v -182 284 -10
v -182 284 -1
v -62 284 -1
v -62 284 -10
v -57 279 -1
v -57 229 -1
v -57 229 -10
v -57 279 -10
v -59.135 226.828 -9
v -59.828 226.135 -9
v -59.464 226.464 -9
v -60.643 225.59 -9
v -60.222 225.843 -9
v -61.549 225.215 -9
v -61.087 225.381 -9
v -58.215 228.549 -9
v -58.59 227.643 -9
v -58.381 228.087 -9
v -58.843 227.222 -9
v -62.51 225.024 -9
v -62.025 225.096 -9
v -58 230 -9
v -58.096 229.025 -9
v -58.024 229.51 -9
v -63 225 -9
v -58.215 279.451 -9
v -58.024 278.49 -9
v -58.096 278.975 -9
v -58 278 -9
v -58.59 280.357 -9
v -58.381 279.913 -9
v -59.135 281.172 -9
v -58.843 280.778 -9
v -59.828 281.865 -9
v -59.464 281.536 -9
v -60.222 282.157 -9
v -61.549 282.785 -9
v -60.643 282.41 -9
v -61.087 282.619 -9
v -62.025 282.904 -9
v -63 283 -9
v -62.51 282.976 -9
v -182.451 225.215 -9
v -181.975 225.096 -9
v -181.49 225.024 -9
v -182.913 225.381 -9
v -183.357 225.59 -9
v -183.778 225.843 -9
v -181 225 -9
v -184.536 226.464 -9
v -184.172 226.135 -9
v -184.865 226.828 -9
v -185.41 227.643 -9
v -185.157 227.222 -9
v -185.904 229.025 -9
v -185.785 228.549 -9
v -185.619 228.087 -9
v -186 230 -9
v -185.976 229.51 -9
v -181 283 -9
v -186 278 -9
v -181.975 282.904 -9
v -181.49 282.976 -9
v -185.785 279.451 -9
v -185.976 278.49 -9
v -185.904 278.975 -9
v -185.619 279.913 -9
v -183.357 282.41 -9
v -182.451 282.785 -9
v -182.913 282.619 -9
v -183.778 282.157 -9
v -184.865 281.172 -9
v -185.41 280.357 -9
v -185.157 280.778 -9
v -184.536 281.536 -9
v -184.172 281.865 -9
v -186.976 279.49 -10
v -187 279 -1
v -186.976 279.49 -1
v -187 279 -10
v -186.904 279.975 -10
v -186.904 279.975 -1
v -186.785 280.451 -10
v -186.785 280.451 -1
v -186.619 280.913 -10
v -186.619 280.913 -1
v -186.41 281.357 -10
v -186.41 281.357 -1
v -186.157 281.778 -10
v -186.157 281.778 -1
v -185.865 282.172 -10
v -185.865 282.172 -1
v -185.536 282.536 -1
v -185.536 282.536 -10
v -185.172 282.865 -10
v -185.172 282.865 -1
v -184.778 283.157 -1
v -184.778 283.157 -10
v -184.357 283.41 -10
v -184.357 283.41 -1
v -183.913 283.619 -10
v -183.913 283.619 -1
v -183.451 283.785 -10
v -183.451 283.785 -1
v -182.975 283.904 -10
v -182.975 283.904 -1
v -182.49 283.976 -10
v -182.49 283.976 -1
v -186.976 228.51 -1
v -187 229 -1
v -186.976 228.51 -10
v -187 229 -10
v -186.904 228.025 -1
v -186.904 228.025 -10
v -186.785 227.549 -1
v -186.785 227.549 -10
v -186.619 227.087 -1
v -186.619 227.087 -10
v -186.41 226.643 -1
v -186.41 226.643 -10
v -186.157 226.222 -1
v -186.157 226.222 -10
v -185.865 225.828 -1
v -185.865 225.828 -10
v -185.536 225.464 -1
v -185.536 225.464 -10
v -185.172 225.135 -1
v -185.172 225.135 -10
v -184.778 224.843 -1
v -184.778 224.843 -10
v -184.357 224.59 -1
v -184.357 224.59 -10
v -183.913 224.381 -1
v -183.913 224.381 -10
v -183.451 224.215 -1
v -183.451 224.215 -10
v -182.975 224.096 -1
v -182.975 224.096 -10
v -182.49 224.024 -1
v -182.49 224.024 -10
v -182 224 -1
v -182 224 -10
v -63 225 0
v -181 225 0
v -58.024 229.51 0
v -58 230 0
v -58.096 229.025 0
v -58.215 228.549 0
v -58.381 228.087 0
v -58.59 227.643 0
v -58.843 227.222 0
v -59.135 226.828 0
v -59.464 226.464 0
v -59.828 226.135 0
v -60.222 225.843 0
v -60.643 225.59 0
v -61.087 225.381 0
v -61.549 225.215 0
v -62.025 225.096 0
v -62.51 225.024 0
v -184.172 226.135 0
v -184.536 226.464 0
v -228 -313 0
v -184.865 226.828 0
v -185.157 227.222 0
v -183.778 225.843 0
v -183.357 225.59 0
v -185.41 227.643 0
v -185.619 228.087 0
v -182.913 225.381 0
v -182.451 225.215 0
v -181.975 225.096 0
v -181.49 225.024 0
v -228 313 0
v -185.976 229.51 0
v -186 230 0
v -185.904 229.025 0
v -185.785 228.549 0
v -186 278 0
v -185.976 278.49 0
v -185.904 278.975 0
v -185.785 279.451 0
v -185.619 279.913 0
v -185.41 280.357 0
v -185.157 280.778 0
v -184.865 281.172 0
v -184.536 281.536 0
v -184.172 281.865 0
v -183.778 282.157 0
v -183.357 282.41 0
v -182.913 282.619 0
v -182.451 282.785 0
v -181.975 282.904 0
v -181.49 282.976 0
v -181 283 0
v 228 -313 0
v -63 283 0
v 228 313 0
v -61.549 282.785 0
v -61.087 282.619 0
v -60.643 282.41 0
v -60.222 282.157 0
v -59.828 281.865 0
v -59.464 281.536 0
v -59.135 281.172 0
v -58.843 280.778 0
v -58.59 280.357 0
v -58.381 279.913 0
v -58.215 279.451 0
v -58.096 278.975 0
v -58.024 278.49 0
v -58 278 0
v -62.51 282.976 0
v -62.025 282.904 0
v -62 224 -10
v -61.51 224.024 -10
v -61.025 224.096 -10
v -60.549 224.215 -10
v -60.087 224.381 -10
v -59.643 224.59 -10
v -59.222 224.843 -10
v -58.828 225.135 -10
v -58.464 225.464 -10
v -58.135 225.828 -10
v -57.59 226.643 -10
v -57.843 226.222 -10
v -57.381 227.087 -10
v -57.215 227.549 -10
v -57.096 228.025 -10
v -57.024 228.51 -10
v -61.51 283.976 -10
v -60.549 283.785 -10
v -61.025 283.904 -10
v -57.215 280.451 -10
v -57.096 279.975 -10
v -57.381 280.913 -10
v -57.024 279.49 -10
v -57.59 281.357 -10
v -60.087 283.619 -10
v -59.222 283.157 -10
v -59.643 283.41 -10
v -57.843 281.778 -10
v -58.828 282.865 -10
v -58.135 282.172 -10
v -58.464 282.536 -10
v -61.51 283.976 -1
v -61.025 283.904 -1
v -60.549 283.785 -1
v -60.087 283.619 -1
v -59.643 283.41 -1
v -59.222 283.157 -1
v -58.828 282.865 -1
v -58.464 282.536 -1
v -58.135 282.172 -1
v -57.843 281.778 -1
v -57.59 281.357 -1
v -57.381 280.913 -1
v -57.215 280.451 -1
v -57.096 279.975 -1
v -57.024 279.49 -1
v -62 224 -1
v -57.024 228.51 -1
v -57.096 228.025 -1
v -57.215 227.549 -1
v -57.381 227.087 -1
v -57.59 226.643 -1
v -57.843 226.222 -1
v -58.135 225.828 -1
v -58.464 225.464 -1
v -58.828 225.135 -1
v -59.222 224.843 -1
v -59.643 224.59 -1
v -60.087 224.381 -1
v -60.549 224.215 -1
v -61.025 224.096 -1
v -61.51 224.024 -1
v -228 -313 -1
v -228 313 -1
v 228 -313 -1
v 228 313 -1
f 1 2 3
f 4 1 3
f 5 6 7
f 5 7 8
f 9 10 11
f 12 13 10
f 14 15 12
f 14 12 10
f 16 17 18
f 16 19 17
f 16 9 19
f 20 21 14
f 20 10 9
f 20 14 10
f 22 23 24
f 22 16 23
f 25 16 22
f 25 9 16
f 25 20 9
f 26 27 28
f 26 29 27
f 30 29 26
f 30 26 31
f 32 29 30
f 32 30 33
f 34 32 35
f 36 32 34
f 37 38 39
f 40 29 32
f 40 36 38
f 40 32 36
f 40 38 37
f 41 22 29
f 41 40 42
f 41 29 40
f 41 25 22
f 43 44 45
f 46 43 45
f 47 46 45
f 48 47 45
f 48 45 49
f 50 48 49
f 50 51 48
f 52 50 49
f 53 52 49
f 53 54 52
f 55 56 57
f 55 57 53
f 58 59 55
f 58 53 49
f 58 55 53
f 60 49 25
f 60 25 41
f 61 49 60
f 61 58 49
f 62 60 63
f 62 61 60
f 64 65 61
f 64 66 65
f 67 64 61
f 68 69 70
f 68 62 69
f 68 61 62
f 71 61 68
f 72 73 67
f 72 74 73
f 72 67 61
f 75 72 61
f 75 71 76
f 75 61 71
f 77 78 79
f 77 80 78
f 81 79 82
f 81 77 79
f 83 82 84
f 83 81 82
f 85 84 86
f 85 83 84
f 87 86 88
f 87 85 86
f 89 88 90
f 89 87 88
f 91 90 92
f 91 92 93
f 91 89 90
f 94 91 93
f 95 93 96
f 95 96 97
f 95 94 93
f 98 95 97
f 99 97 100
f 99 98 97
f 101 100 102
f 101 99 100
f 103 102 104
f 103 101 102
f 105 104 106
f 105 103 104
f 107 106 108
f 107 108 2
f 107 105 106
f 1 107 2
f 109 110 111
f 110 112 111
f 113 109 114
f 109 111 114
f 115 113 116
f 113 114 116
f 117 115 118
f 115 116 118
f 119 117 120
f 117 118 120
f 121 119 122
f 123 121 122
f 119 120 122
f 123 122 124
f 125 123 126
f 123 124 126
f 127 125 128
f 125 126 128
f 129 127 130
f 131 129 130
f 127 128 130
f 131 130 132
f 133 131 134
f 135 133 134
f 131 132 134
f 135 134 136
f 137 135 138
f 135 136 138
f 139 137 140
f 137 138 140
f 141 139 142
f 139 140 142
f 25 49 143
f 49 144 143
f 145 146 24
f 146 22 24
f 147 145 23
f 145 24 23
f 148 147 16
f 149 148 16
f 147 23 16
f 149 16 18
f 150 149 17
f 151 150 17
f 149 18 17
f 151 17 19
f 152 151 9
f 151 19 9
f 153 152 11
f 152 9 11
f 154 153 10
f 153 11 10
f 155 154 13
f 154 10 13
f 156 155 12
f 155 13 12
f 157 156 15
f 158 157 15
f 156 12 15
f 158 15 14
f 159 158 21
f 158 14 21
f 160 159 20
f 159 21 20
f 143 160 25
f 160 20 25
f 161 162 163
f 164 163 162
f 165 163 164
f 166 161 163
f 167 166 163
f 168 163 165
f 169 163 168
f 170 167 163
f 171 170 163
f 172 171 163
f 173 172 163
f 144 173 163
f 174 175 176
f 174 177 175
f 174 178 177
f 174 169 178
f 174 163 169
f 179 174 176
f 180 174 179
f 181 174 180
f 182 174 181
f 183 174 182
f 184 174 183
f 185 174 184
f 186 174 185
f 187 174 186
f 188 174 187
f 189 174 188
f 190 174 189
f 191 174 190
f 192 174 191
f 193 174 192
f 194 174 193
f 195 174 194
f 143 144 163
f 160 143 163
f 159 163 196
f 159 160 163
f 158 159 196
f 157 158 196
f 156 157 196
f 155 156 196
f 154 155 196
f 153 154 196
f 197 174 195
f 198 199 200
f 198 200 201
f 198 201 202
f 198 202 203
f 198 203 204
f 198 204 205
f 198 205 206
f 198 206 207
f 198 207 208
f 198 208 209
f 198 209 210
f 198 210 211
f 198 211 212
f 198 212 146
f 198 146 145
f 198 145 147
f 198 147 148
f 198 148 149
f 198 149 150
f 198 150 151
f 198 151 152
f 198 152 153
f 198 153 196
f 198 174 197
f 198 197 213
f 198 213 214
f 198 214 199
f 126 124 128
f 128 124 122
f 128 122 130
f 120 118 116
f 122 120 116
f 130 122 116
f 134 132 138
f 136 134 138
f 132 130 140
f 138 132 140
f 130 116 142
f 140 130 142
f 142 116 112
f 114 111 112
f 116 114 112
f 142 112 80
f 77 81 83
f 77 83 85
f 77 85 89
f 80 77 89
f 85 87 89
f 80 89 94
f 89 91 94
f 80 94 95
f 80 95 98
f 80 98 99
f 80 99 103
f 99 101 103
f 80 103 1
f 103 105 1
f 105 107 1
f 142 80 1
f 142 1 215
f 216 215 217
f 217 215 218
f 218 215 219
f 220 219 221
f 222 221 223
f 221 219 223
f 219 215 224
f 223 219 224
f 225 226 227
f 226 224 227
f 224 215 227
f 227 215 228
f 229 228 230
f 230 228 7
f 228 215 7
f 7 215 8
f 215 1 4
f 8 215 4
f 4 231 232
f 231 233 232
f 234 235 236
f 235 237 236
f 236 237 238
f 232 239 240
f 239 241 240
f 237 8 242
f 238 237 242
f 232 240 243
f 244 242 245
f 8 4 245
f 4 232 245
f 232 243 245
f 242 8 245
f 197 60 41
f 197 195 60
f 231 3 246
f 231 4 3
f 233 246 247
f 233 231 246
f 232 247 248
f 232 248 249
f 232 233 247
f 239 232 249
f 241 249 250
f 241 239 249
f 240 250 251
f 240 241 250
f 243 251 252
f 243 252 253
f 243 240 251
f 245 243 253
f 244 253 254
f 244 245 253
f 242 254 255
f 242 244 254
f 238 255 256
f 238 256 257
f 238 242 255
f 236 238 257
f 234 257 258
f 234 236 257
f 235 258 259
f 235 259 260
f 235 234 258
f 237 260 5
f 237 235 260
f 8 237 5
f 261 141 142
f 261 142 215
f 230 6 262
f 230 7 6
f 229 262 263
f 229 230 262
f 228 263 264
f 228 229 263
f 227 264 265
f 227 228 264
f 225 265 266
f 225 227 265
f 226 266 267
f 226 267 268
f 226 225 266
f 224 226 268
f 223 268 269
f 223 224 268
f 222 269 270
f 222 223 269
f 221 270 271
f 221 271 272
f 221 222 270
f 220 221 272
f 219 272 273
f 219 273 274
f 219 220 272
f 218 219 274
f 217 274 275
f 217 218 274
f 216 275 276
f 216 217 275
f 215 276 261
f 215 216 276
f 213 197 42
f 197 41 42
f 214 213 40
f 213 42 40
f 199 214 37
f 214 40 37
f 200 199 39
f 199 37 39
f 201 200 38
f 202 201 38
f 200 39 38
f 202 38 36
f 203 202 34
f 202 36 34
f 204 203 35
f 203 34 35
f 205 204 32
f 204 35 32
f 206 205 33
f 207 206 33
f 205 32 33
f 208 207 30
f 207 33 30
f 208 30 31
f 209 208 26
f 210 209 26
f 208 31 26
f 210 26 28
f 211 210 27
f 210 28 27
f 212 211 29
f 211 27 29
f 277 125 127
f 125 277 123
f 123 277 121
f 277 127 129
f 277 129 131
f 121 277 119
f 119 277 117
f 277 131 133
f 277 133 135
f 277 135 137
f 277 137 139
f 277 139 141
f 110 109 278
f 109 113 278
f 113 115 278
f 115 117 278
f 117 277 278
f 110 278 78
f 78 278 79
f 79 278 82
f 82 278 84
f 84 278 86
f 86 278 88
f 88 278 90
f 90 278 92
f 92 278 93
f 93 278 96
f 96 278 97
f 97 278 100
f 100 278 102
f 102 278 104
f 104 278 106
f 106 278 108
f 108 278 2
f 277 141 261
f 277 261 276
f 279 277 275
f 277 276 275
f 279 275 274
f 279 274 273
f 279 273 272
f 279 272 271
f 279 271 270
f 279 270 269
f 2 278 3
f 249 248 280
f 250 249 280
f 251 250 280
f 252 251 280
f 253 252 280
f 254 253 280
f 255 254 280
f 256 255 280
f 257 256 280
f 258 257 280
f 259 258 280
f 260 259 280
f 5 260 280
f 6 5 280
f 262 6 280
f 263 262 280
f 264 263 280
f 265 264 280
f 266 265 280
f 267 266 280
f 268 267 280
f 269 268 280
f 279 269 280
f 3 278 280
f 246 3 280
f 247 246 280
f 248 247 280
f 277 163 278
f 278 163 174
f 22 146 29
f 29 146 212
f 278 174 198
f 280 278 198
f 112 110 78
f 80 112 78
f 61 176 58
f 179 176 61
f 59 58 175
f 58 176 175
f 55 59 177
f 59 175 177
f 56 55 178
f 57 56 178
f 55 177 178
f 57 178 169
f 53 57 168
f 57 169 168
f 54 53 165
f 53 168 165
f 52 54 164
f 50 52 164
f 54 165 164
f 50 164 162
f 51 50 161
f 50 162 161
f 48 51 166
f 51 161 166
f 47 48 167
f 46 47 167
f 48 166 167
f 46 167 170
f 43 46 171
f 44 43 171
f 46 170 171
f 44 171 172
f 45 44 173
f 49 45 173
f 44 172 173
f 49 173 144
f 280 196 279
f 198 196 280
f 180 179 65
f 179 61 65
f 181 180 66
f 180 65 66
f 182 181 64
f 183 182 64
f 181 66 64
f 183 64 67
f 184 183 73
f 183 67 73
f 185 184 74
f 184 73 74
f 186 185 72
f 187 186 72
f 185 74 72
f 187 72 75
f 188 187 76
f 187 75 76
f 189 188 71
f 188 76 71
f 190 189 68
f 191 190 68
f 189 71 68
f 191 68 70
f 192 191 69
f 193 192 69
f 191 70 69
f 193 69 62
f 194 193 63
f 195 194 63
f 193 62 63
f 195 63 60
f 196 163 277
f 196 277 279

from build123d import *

# Parameters (mm, degrees)
SKETCH1_W           = 456
SKETCH1_H           = 626
BASE_FLANGE1_DEPTH  = 1
SKETCH6_W           = 130
SKETCH6_H           = 60
BOSS_EXTRUDE1_DEPTH = 10
SKETCH7_W           = 128
SKETCH7_H           = 58
CUT_EXTRUDE2_DEPTH  = 1
SHELL2_START        = -186
SHELL2_OUTLINE_W    = 58
SHELL2_OUTLINE_H    = 8
SHELL2_DEPTH        = 128
FILLET1_R           = 5


# Read off the part's stored shape, not the designer's step: Shell2
# Sheet-metal steps are written as plain solids
with BuildPart() as part:
    # Sketch1 → Base-Flange1 (new body)
    with BuildSketch(Plane.XY):
        Rectangle(SKETCH1_W, SKETCH1_H)
    extrude(amount=-BASE_FLANGE1_DEPTH)

    # Sketch6 → Boss-Extrude1 (add)
    with BuildSketch(Plane.XY):
        with Locations((-122, 254)):
            Rectangle(SKETCH6_W, SKETCH6_H)
    extrude(amount=-BOSS_EXTRUDE1_DEPTH)

    # Sketch7 → Cut-Extrude2 (cut)
    with BuildSketch(Plane.XY):
        with Locations((-122, 254)):
            Rectangle(SKETCH7_W, SKETCH7_H)
    extrude(amount=-CUT_EXTRUDE2_DEPTH, mode=Mode.SUBTRACT)

    # Shell2 outline → Shell2 (cut)
    with BuildSketch(Plane.YZ.offset(SHELL2_START)):
        with Locations((254, -5)):
            Rectangle(SHELL2_OUTLINE_W, SHELL2_OUTLINE_H)
    extrude(amount=SHELL2_DEPTH, mode=Mode.SUBTRACT)

    # Fillet1
    fillet1_edges = [part.edges().sort_by_distance(p)[0] for p in [
        (-57, 284, -5.5),
        (-57, 224, -5.5),
        (-187, 224, -5.5),
        (-187, 284, -5.5),
        (-186, 225, -4.5),
        (-186, 283, -4.5),
        (-58, 283, -4.5),
        (-58, 225, -4.5),
    ]]
    fillet(fillet1_edges, radius=FILLET1_R)


solid = part.part
